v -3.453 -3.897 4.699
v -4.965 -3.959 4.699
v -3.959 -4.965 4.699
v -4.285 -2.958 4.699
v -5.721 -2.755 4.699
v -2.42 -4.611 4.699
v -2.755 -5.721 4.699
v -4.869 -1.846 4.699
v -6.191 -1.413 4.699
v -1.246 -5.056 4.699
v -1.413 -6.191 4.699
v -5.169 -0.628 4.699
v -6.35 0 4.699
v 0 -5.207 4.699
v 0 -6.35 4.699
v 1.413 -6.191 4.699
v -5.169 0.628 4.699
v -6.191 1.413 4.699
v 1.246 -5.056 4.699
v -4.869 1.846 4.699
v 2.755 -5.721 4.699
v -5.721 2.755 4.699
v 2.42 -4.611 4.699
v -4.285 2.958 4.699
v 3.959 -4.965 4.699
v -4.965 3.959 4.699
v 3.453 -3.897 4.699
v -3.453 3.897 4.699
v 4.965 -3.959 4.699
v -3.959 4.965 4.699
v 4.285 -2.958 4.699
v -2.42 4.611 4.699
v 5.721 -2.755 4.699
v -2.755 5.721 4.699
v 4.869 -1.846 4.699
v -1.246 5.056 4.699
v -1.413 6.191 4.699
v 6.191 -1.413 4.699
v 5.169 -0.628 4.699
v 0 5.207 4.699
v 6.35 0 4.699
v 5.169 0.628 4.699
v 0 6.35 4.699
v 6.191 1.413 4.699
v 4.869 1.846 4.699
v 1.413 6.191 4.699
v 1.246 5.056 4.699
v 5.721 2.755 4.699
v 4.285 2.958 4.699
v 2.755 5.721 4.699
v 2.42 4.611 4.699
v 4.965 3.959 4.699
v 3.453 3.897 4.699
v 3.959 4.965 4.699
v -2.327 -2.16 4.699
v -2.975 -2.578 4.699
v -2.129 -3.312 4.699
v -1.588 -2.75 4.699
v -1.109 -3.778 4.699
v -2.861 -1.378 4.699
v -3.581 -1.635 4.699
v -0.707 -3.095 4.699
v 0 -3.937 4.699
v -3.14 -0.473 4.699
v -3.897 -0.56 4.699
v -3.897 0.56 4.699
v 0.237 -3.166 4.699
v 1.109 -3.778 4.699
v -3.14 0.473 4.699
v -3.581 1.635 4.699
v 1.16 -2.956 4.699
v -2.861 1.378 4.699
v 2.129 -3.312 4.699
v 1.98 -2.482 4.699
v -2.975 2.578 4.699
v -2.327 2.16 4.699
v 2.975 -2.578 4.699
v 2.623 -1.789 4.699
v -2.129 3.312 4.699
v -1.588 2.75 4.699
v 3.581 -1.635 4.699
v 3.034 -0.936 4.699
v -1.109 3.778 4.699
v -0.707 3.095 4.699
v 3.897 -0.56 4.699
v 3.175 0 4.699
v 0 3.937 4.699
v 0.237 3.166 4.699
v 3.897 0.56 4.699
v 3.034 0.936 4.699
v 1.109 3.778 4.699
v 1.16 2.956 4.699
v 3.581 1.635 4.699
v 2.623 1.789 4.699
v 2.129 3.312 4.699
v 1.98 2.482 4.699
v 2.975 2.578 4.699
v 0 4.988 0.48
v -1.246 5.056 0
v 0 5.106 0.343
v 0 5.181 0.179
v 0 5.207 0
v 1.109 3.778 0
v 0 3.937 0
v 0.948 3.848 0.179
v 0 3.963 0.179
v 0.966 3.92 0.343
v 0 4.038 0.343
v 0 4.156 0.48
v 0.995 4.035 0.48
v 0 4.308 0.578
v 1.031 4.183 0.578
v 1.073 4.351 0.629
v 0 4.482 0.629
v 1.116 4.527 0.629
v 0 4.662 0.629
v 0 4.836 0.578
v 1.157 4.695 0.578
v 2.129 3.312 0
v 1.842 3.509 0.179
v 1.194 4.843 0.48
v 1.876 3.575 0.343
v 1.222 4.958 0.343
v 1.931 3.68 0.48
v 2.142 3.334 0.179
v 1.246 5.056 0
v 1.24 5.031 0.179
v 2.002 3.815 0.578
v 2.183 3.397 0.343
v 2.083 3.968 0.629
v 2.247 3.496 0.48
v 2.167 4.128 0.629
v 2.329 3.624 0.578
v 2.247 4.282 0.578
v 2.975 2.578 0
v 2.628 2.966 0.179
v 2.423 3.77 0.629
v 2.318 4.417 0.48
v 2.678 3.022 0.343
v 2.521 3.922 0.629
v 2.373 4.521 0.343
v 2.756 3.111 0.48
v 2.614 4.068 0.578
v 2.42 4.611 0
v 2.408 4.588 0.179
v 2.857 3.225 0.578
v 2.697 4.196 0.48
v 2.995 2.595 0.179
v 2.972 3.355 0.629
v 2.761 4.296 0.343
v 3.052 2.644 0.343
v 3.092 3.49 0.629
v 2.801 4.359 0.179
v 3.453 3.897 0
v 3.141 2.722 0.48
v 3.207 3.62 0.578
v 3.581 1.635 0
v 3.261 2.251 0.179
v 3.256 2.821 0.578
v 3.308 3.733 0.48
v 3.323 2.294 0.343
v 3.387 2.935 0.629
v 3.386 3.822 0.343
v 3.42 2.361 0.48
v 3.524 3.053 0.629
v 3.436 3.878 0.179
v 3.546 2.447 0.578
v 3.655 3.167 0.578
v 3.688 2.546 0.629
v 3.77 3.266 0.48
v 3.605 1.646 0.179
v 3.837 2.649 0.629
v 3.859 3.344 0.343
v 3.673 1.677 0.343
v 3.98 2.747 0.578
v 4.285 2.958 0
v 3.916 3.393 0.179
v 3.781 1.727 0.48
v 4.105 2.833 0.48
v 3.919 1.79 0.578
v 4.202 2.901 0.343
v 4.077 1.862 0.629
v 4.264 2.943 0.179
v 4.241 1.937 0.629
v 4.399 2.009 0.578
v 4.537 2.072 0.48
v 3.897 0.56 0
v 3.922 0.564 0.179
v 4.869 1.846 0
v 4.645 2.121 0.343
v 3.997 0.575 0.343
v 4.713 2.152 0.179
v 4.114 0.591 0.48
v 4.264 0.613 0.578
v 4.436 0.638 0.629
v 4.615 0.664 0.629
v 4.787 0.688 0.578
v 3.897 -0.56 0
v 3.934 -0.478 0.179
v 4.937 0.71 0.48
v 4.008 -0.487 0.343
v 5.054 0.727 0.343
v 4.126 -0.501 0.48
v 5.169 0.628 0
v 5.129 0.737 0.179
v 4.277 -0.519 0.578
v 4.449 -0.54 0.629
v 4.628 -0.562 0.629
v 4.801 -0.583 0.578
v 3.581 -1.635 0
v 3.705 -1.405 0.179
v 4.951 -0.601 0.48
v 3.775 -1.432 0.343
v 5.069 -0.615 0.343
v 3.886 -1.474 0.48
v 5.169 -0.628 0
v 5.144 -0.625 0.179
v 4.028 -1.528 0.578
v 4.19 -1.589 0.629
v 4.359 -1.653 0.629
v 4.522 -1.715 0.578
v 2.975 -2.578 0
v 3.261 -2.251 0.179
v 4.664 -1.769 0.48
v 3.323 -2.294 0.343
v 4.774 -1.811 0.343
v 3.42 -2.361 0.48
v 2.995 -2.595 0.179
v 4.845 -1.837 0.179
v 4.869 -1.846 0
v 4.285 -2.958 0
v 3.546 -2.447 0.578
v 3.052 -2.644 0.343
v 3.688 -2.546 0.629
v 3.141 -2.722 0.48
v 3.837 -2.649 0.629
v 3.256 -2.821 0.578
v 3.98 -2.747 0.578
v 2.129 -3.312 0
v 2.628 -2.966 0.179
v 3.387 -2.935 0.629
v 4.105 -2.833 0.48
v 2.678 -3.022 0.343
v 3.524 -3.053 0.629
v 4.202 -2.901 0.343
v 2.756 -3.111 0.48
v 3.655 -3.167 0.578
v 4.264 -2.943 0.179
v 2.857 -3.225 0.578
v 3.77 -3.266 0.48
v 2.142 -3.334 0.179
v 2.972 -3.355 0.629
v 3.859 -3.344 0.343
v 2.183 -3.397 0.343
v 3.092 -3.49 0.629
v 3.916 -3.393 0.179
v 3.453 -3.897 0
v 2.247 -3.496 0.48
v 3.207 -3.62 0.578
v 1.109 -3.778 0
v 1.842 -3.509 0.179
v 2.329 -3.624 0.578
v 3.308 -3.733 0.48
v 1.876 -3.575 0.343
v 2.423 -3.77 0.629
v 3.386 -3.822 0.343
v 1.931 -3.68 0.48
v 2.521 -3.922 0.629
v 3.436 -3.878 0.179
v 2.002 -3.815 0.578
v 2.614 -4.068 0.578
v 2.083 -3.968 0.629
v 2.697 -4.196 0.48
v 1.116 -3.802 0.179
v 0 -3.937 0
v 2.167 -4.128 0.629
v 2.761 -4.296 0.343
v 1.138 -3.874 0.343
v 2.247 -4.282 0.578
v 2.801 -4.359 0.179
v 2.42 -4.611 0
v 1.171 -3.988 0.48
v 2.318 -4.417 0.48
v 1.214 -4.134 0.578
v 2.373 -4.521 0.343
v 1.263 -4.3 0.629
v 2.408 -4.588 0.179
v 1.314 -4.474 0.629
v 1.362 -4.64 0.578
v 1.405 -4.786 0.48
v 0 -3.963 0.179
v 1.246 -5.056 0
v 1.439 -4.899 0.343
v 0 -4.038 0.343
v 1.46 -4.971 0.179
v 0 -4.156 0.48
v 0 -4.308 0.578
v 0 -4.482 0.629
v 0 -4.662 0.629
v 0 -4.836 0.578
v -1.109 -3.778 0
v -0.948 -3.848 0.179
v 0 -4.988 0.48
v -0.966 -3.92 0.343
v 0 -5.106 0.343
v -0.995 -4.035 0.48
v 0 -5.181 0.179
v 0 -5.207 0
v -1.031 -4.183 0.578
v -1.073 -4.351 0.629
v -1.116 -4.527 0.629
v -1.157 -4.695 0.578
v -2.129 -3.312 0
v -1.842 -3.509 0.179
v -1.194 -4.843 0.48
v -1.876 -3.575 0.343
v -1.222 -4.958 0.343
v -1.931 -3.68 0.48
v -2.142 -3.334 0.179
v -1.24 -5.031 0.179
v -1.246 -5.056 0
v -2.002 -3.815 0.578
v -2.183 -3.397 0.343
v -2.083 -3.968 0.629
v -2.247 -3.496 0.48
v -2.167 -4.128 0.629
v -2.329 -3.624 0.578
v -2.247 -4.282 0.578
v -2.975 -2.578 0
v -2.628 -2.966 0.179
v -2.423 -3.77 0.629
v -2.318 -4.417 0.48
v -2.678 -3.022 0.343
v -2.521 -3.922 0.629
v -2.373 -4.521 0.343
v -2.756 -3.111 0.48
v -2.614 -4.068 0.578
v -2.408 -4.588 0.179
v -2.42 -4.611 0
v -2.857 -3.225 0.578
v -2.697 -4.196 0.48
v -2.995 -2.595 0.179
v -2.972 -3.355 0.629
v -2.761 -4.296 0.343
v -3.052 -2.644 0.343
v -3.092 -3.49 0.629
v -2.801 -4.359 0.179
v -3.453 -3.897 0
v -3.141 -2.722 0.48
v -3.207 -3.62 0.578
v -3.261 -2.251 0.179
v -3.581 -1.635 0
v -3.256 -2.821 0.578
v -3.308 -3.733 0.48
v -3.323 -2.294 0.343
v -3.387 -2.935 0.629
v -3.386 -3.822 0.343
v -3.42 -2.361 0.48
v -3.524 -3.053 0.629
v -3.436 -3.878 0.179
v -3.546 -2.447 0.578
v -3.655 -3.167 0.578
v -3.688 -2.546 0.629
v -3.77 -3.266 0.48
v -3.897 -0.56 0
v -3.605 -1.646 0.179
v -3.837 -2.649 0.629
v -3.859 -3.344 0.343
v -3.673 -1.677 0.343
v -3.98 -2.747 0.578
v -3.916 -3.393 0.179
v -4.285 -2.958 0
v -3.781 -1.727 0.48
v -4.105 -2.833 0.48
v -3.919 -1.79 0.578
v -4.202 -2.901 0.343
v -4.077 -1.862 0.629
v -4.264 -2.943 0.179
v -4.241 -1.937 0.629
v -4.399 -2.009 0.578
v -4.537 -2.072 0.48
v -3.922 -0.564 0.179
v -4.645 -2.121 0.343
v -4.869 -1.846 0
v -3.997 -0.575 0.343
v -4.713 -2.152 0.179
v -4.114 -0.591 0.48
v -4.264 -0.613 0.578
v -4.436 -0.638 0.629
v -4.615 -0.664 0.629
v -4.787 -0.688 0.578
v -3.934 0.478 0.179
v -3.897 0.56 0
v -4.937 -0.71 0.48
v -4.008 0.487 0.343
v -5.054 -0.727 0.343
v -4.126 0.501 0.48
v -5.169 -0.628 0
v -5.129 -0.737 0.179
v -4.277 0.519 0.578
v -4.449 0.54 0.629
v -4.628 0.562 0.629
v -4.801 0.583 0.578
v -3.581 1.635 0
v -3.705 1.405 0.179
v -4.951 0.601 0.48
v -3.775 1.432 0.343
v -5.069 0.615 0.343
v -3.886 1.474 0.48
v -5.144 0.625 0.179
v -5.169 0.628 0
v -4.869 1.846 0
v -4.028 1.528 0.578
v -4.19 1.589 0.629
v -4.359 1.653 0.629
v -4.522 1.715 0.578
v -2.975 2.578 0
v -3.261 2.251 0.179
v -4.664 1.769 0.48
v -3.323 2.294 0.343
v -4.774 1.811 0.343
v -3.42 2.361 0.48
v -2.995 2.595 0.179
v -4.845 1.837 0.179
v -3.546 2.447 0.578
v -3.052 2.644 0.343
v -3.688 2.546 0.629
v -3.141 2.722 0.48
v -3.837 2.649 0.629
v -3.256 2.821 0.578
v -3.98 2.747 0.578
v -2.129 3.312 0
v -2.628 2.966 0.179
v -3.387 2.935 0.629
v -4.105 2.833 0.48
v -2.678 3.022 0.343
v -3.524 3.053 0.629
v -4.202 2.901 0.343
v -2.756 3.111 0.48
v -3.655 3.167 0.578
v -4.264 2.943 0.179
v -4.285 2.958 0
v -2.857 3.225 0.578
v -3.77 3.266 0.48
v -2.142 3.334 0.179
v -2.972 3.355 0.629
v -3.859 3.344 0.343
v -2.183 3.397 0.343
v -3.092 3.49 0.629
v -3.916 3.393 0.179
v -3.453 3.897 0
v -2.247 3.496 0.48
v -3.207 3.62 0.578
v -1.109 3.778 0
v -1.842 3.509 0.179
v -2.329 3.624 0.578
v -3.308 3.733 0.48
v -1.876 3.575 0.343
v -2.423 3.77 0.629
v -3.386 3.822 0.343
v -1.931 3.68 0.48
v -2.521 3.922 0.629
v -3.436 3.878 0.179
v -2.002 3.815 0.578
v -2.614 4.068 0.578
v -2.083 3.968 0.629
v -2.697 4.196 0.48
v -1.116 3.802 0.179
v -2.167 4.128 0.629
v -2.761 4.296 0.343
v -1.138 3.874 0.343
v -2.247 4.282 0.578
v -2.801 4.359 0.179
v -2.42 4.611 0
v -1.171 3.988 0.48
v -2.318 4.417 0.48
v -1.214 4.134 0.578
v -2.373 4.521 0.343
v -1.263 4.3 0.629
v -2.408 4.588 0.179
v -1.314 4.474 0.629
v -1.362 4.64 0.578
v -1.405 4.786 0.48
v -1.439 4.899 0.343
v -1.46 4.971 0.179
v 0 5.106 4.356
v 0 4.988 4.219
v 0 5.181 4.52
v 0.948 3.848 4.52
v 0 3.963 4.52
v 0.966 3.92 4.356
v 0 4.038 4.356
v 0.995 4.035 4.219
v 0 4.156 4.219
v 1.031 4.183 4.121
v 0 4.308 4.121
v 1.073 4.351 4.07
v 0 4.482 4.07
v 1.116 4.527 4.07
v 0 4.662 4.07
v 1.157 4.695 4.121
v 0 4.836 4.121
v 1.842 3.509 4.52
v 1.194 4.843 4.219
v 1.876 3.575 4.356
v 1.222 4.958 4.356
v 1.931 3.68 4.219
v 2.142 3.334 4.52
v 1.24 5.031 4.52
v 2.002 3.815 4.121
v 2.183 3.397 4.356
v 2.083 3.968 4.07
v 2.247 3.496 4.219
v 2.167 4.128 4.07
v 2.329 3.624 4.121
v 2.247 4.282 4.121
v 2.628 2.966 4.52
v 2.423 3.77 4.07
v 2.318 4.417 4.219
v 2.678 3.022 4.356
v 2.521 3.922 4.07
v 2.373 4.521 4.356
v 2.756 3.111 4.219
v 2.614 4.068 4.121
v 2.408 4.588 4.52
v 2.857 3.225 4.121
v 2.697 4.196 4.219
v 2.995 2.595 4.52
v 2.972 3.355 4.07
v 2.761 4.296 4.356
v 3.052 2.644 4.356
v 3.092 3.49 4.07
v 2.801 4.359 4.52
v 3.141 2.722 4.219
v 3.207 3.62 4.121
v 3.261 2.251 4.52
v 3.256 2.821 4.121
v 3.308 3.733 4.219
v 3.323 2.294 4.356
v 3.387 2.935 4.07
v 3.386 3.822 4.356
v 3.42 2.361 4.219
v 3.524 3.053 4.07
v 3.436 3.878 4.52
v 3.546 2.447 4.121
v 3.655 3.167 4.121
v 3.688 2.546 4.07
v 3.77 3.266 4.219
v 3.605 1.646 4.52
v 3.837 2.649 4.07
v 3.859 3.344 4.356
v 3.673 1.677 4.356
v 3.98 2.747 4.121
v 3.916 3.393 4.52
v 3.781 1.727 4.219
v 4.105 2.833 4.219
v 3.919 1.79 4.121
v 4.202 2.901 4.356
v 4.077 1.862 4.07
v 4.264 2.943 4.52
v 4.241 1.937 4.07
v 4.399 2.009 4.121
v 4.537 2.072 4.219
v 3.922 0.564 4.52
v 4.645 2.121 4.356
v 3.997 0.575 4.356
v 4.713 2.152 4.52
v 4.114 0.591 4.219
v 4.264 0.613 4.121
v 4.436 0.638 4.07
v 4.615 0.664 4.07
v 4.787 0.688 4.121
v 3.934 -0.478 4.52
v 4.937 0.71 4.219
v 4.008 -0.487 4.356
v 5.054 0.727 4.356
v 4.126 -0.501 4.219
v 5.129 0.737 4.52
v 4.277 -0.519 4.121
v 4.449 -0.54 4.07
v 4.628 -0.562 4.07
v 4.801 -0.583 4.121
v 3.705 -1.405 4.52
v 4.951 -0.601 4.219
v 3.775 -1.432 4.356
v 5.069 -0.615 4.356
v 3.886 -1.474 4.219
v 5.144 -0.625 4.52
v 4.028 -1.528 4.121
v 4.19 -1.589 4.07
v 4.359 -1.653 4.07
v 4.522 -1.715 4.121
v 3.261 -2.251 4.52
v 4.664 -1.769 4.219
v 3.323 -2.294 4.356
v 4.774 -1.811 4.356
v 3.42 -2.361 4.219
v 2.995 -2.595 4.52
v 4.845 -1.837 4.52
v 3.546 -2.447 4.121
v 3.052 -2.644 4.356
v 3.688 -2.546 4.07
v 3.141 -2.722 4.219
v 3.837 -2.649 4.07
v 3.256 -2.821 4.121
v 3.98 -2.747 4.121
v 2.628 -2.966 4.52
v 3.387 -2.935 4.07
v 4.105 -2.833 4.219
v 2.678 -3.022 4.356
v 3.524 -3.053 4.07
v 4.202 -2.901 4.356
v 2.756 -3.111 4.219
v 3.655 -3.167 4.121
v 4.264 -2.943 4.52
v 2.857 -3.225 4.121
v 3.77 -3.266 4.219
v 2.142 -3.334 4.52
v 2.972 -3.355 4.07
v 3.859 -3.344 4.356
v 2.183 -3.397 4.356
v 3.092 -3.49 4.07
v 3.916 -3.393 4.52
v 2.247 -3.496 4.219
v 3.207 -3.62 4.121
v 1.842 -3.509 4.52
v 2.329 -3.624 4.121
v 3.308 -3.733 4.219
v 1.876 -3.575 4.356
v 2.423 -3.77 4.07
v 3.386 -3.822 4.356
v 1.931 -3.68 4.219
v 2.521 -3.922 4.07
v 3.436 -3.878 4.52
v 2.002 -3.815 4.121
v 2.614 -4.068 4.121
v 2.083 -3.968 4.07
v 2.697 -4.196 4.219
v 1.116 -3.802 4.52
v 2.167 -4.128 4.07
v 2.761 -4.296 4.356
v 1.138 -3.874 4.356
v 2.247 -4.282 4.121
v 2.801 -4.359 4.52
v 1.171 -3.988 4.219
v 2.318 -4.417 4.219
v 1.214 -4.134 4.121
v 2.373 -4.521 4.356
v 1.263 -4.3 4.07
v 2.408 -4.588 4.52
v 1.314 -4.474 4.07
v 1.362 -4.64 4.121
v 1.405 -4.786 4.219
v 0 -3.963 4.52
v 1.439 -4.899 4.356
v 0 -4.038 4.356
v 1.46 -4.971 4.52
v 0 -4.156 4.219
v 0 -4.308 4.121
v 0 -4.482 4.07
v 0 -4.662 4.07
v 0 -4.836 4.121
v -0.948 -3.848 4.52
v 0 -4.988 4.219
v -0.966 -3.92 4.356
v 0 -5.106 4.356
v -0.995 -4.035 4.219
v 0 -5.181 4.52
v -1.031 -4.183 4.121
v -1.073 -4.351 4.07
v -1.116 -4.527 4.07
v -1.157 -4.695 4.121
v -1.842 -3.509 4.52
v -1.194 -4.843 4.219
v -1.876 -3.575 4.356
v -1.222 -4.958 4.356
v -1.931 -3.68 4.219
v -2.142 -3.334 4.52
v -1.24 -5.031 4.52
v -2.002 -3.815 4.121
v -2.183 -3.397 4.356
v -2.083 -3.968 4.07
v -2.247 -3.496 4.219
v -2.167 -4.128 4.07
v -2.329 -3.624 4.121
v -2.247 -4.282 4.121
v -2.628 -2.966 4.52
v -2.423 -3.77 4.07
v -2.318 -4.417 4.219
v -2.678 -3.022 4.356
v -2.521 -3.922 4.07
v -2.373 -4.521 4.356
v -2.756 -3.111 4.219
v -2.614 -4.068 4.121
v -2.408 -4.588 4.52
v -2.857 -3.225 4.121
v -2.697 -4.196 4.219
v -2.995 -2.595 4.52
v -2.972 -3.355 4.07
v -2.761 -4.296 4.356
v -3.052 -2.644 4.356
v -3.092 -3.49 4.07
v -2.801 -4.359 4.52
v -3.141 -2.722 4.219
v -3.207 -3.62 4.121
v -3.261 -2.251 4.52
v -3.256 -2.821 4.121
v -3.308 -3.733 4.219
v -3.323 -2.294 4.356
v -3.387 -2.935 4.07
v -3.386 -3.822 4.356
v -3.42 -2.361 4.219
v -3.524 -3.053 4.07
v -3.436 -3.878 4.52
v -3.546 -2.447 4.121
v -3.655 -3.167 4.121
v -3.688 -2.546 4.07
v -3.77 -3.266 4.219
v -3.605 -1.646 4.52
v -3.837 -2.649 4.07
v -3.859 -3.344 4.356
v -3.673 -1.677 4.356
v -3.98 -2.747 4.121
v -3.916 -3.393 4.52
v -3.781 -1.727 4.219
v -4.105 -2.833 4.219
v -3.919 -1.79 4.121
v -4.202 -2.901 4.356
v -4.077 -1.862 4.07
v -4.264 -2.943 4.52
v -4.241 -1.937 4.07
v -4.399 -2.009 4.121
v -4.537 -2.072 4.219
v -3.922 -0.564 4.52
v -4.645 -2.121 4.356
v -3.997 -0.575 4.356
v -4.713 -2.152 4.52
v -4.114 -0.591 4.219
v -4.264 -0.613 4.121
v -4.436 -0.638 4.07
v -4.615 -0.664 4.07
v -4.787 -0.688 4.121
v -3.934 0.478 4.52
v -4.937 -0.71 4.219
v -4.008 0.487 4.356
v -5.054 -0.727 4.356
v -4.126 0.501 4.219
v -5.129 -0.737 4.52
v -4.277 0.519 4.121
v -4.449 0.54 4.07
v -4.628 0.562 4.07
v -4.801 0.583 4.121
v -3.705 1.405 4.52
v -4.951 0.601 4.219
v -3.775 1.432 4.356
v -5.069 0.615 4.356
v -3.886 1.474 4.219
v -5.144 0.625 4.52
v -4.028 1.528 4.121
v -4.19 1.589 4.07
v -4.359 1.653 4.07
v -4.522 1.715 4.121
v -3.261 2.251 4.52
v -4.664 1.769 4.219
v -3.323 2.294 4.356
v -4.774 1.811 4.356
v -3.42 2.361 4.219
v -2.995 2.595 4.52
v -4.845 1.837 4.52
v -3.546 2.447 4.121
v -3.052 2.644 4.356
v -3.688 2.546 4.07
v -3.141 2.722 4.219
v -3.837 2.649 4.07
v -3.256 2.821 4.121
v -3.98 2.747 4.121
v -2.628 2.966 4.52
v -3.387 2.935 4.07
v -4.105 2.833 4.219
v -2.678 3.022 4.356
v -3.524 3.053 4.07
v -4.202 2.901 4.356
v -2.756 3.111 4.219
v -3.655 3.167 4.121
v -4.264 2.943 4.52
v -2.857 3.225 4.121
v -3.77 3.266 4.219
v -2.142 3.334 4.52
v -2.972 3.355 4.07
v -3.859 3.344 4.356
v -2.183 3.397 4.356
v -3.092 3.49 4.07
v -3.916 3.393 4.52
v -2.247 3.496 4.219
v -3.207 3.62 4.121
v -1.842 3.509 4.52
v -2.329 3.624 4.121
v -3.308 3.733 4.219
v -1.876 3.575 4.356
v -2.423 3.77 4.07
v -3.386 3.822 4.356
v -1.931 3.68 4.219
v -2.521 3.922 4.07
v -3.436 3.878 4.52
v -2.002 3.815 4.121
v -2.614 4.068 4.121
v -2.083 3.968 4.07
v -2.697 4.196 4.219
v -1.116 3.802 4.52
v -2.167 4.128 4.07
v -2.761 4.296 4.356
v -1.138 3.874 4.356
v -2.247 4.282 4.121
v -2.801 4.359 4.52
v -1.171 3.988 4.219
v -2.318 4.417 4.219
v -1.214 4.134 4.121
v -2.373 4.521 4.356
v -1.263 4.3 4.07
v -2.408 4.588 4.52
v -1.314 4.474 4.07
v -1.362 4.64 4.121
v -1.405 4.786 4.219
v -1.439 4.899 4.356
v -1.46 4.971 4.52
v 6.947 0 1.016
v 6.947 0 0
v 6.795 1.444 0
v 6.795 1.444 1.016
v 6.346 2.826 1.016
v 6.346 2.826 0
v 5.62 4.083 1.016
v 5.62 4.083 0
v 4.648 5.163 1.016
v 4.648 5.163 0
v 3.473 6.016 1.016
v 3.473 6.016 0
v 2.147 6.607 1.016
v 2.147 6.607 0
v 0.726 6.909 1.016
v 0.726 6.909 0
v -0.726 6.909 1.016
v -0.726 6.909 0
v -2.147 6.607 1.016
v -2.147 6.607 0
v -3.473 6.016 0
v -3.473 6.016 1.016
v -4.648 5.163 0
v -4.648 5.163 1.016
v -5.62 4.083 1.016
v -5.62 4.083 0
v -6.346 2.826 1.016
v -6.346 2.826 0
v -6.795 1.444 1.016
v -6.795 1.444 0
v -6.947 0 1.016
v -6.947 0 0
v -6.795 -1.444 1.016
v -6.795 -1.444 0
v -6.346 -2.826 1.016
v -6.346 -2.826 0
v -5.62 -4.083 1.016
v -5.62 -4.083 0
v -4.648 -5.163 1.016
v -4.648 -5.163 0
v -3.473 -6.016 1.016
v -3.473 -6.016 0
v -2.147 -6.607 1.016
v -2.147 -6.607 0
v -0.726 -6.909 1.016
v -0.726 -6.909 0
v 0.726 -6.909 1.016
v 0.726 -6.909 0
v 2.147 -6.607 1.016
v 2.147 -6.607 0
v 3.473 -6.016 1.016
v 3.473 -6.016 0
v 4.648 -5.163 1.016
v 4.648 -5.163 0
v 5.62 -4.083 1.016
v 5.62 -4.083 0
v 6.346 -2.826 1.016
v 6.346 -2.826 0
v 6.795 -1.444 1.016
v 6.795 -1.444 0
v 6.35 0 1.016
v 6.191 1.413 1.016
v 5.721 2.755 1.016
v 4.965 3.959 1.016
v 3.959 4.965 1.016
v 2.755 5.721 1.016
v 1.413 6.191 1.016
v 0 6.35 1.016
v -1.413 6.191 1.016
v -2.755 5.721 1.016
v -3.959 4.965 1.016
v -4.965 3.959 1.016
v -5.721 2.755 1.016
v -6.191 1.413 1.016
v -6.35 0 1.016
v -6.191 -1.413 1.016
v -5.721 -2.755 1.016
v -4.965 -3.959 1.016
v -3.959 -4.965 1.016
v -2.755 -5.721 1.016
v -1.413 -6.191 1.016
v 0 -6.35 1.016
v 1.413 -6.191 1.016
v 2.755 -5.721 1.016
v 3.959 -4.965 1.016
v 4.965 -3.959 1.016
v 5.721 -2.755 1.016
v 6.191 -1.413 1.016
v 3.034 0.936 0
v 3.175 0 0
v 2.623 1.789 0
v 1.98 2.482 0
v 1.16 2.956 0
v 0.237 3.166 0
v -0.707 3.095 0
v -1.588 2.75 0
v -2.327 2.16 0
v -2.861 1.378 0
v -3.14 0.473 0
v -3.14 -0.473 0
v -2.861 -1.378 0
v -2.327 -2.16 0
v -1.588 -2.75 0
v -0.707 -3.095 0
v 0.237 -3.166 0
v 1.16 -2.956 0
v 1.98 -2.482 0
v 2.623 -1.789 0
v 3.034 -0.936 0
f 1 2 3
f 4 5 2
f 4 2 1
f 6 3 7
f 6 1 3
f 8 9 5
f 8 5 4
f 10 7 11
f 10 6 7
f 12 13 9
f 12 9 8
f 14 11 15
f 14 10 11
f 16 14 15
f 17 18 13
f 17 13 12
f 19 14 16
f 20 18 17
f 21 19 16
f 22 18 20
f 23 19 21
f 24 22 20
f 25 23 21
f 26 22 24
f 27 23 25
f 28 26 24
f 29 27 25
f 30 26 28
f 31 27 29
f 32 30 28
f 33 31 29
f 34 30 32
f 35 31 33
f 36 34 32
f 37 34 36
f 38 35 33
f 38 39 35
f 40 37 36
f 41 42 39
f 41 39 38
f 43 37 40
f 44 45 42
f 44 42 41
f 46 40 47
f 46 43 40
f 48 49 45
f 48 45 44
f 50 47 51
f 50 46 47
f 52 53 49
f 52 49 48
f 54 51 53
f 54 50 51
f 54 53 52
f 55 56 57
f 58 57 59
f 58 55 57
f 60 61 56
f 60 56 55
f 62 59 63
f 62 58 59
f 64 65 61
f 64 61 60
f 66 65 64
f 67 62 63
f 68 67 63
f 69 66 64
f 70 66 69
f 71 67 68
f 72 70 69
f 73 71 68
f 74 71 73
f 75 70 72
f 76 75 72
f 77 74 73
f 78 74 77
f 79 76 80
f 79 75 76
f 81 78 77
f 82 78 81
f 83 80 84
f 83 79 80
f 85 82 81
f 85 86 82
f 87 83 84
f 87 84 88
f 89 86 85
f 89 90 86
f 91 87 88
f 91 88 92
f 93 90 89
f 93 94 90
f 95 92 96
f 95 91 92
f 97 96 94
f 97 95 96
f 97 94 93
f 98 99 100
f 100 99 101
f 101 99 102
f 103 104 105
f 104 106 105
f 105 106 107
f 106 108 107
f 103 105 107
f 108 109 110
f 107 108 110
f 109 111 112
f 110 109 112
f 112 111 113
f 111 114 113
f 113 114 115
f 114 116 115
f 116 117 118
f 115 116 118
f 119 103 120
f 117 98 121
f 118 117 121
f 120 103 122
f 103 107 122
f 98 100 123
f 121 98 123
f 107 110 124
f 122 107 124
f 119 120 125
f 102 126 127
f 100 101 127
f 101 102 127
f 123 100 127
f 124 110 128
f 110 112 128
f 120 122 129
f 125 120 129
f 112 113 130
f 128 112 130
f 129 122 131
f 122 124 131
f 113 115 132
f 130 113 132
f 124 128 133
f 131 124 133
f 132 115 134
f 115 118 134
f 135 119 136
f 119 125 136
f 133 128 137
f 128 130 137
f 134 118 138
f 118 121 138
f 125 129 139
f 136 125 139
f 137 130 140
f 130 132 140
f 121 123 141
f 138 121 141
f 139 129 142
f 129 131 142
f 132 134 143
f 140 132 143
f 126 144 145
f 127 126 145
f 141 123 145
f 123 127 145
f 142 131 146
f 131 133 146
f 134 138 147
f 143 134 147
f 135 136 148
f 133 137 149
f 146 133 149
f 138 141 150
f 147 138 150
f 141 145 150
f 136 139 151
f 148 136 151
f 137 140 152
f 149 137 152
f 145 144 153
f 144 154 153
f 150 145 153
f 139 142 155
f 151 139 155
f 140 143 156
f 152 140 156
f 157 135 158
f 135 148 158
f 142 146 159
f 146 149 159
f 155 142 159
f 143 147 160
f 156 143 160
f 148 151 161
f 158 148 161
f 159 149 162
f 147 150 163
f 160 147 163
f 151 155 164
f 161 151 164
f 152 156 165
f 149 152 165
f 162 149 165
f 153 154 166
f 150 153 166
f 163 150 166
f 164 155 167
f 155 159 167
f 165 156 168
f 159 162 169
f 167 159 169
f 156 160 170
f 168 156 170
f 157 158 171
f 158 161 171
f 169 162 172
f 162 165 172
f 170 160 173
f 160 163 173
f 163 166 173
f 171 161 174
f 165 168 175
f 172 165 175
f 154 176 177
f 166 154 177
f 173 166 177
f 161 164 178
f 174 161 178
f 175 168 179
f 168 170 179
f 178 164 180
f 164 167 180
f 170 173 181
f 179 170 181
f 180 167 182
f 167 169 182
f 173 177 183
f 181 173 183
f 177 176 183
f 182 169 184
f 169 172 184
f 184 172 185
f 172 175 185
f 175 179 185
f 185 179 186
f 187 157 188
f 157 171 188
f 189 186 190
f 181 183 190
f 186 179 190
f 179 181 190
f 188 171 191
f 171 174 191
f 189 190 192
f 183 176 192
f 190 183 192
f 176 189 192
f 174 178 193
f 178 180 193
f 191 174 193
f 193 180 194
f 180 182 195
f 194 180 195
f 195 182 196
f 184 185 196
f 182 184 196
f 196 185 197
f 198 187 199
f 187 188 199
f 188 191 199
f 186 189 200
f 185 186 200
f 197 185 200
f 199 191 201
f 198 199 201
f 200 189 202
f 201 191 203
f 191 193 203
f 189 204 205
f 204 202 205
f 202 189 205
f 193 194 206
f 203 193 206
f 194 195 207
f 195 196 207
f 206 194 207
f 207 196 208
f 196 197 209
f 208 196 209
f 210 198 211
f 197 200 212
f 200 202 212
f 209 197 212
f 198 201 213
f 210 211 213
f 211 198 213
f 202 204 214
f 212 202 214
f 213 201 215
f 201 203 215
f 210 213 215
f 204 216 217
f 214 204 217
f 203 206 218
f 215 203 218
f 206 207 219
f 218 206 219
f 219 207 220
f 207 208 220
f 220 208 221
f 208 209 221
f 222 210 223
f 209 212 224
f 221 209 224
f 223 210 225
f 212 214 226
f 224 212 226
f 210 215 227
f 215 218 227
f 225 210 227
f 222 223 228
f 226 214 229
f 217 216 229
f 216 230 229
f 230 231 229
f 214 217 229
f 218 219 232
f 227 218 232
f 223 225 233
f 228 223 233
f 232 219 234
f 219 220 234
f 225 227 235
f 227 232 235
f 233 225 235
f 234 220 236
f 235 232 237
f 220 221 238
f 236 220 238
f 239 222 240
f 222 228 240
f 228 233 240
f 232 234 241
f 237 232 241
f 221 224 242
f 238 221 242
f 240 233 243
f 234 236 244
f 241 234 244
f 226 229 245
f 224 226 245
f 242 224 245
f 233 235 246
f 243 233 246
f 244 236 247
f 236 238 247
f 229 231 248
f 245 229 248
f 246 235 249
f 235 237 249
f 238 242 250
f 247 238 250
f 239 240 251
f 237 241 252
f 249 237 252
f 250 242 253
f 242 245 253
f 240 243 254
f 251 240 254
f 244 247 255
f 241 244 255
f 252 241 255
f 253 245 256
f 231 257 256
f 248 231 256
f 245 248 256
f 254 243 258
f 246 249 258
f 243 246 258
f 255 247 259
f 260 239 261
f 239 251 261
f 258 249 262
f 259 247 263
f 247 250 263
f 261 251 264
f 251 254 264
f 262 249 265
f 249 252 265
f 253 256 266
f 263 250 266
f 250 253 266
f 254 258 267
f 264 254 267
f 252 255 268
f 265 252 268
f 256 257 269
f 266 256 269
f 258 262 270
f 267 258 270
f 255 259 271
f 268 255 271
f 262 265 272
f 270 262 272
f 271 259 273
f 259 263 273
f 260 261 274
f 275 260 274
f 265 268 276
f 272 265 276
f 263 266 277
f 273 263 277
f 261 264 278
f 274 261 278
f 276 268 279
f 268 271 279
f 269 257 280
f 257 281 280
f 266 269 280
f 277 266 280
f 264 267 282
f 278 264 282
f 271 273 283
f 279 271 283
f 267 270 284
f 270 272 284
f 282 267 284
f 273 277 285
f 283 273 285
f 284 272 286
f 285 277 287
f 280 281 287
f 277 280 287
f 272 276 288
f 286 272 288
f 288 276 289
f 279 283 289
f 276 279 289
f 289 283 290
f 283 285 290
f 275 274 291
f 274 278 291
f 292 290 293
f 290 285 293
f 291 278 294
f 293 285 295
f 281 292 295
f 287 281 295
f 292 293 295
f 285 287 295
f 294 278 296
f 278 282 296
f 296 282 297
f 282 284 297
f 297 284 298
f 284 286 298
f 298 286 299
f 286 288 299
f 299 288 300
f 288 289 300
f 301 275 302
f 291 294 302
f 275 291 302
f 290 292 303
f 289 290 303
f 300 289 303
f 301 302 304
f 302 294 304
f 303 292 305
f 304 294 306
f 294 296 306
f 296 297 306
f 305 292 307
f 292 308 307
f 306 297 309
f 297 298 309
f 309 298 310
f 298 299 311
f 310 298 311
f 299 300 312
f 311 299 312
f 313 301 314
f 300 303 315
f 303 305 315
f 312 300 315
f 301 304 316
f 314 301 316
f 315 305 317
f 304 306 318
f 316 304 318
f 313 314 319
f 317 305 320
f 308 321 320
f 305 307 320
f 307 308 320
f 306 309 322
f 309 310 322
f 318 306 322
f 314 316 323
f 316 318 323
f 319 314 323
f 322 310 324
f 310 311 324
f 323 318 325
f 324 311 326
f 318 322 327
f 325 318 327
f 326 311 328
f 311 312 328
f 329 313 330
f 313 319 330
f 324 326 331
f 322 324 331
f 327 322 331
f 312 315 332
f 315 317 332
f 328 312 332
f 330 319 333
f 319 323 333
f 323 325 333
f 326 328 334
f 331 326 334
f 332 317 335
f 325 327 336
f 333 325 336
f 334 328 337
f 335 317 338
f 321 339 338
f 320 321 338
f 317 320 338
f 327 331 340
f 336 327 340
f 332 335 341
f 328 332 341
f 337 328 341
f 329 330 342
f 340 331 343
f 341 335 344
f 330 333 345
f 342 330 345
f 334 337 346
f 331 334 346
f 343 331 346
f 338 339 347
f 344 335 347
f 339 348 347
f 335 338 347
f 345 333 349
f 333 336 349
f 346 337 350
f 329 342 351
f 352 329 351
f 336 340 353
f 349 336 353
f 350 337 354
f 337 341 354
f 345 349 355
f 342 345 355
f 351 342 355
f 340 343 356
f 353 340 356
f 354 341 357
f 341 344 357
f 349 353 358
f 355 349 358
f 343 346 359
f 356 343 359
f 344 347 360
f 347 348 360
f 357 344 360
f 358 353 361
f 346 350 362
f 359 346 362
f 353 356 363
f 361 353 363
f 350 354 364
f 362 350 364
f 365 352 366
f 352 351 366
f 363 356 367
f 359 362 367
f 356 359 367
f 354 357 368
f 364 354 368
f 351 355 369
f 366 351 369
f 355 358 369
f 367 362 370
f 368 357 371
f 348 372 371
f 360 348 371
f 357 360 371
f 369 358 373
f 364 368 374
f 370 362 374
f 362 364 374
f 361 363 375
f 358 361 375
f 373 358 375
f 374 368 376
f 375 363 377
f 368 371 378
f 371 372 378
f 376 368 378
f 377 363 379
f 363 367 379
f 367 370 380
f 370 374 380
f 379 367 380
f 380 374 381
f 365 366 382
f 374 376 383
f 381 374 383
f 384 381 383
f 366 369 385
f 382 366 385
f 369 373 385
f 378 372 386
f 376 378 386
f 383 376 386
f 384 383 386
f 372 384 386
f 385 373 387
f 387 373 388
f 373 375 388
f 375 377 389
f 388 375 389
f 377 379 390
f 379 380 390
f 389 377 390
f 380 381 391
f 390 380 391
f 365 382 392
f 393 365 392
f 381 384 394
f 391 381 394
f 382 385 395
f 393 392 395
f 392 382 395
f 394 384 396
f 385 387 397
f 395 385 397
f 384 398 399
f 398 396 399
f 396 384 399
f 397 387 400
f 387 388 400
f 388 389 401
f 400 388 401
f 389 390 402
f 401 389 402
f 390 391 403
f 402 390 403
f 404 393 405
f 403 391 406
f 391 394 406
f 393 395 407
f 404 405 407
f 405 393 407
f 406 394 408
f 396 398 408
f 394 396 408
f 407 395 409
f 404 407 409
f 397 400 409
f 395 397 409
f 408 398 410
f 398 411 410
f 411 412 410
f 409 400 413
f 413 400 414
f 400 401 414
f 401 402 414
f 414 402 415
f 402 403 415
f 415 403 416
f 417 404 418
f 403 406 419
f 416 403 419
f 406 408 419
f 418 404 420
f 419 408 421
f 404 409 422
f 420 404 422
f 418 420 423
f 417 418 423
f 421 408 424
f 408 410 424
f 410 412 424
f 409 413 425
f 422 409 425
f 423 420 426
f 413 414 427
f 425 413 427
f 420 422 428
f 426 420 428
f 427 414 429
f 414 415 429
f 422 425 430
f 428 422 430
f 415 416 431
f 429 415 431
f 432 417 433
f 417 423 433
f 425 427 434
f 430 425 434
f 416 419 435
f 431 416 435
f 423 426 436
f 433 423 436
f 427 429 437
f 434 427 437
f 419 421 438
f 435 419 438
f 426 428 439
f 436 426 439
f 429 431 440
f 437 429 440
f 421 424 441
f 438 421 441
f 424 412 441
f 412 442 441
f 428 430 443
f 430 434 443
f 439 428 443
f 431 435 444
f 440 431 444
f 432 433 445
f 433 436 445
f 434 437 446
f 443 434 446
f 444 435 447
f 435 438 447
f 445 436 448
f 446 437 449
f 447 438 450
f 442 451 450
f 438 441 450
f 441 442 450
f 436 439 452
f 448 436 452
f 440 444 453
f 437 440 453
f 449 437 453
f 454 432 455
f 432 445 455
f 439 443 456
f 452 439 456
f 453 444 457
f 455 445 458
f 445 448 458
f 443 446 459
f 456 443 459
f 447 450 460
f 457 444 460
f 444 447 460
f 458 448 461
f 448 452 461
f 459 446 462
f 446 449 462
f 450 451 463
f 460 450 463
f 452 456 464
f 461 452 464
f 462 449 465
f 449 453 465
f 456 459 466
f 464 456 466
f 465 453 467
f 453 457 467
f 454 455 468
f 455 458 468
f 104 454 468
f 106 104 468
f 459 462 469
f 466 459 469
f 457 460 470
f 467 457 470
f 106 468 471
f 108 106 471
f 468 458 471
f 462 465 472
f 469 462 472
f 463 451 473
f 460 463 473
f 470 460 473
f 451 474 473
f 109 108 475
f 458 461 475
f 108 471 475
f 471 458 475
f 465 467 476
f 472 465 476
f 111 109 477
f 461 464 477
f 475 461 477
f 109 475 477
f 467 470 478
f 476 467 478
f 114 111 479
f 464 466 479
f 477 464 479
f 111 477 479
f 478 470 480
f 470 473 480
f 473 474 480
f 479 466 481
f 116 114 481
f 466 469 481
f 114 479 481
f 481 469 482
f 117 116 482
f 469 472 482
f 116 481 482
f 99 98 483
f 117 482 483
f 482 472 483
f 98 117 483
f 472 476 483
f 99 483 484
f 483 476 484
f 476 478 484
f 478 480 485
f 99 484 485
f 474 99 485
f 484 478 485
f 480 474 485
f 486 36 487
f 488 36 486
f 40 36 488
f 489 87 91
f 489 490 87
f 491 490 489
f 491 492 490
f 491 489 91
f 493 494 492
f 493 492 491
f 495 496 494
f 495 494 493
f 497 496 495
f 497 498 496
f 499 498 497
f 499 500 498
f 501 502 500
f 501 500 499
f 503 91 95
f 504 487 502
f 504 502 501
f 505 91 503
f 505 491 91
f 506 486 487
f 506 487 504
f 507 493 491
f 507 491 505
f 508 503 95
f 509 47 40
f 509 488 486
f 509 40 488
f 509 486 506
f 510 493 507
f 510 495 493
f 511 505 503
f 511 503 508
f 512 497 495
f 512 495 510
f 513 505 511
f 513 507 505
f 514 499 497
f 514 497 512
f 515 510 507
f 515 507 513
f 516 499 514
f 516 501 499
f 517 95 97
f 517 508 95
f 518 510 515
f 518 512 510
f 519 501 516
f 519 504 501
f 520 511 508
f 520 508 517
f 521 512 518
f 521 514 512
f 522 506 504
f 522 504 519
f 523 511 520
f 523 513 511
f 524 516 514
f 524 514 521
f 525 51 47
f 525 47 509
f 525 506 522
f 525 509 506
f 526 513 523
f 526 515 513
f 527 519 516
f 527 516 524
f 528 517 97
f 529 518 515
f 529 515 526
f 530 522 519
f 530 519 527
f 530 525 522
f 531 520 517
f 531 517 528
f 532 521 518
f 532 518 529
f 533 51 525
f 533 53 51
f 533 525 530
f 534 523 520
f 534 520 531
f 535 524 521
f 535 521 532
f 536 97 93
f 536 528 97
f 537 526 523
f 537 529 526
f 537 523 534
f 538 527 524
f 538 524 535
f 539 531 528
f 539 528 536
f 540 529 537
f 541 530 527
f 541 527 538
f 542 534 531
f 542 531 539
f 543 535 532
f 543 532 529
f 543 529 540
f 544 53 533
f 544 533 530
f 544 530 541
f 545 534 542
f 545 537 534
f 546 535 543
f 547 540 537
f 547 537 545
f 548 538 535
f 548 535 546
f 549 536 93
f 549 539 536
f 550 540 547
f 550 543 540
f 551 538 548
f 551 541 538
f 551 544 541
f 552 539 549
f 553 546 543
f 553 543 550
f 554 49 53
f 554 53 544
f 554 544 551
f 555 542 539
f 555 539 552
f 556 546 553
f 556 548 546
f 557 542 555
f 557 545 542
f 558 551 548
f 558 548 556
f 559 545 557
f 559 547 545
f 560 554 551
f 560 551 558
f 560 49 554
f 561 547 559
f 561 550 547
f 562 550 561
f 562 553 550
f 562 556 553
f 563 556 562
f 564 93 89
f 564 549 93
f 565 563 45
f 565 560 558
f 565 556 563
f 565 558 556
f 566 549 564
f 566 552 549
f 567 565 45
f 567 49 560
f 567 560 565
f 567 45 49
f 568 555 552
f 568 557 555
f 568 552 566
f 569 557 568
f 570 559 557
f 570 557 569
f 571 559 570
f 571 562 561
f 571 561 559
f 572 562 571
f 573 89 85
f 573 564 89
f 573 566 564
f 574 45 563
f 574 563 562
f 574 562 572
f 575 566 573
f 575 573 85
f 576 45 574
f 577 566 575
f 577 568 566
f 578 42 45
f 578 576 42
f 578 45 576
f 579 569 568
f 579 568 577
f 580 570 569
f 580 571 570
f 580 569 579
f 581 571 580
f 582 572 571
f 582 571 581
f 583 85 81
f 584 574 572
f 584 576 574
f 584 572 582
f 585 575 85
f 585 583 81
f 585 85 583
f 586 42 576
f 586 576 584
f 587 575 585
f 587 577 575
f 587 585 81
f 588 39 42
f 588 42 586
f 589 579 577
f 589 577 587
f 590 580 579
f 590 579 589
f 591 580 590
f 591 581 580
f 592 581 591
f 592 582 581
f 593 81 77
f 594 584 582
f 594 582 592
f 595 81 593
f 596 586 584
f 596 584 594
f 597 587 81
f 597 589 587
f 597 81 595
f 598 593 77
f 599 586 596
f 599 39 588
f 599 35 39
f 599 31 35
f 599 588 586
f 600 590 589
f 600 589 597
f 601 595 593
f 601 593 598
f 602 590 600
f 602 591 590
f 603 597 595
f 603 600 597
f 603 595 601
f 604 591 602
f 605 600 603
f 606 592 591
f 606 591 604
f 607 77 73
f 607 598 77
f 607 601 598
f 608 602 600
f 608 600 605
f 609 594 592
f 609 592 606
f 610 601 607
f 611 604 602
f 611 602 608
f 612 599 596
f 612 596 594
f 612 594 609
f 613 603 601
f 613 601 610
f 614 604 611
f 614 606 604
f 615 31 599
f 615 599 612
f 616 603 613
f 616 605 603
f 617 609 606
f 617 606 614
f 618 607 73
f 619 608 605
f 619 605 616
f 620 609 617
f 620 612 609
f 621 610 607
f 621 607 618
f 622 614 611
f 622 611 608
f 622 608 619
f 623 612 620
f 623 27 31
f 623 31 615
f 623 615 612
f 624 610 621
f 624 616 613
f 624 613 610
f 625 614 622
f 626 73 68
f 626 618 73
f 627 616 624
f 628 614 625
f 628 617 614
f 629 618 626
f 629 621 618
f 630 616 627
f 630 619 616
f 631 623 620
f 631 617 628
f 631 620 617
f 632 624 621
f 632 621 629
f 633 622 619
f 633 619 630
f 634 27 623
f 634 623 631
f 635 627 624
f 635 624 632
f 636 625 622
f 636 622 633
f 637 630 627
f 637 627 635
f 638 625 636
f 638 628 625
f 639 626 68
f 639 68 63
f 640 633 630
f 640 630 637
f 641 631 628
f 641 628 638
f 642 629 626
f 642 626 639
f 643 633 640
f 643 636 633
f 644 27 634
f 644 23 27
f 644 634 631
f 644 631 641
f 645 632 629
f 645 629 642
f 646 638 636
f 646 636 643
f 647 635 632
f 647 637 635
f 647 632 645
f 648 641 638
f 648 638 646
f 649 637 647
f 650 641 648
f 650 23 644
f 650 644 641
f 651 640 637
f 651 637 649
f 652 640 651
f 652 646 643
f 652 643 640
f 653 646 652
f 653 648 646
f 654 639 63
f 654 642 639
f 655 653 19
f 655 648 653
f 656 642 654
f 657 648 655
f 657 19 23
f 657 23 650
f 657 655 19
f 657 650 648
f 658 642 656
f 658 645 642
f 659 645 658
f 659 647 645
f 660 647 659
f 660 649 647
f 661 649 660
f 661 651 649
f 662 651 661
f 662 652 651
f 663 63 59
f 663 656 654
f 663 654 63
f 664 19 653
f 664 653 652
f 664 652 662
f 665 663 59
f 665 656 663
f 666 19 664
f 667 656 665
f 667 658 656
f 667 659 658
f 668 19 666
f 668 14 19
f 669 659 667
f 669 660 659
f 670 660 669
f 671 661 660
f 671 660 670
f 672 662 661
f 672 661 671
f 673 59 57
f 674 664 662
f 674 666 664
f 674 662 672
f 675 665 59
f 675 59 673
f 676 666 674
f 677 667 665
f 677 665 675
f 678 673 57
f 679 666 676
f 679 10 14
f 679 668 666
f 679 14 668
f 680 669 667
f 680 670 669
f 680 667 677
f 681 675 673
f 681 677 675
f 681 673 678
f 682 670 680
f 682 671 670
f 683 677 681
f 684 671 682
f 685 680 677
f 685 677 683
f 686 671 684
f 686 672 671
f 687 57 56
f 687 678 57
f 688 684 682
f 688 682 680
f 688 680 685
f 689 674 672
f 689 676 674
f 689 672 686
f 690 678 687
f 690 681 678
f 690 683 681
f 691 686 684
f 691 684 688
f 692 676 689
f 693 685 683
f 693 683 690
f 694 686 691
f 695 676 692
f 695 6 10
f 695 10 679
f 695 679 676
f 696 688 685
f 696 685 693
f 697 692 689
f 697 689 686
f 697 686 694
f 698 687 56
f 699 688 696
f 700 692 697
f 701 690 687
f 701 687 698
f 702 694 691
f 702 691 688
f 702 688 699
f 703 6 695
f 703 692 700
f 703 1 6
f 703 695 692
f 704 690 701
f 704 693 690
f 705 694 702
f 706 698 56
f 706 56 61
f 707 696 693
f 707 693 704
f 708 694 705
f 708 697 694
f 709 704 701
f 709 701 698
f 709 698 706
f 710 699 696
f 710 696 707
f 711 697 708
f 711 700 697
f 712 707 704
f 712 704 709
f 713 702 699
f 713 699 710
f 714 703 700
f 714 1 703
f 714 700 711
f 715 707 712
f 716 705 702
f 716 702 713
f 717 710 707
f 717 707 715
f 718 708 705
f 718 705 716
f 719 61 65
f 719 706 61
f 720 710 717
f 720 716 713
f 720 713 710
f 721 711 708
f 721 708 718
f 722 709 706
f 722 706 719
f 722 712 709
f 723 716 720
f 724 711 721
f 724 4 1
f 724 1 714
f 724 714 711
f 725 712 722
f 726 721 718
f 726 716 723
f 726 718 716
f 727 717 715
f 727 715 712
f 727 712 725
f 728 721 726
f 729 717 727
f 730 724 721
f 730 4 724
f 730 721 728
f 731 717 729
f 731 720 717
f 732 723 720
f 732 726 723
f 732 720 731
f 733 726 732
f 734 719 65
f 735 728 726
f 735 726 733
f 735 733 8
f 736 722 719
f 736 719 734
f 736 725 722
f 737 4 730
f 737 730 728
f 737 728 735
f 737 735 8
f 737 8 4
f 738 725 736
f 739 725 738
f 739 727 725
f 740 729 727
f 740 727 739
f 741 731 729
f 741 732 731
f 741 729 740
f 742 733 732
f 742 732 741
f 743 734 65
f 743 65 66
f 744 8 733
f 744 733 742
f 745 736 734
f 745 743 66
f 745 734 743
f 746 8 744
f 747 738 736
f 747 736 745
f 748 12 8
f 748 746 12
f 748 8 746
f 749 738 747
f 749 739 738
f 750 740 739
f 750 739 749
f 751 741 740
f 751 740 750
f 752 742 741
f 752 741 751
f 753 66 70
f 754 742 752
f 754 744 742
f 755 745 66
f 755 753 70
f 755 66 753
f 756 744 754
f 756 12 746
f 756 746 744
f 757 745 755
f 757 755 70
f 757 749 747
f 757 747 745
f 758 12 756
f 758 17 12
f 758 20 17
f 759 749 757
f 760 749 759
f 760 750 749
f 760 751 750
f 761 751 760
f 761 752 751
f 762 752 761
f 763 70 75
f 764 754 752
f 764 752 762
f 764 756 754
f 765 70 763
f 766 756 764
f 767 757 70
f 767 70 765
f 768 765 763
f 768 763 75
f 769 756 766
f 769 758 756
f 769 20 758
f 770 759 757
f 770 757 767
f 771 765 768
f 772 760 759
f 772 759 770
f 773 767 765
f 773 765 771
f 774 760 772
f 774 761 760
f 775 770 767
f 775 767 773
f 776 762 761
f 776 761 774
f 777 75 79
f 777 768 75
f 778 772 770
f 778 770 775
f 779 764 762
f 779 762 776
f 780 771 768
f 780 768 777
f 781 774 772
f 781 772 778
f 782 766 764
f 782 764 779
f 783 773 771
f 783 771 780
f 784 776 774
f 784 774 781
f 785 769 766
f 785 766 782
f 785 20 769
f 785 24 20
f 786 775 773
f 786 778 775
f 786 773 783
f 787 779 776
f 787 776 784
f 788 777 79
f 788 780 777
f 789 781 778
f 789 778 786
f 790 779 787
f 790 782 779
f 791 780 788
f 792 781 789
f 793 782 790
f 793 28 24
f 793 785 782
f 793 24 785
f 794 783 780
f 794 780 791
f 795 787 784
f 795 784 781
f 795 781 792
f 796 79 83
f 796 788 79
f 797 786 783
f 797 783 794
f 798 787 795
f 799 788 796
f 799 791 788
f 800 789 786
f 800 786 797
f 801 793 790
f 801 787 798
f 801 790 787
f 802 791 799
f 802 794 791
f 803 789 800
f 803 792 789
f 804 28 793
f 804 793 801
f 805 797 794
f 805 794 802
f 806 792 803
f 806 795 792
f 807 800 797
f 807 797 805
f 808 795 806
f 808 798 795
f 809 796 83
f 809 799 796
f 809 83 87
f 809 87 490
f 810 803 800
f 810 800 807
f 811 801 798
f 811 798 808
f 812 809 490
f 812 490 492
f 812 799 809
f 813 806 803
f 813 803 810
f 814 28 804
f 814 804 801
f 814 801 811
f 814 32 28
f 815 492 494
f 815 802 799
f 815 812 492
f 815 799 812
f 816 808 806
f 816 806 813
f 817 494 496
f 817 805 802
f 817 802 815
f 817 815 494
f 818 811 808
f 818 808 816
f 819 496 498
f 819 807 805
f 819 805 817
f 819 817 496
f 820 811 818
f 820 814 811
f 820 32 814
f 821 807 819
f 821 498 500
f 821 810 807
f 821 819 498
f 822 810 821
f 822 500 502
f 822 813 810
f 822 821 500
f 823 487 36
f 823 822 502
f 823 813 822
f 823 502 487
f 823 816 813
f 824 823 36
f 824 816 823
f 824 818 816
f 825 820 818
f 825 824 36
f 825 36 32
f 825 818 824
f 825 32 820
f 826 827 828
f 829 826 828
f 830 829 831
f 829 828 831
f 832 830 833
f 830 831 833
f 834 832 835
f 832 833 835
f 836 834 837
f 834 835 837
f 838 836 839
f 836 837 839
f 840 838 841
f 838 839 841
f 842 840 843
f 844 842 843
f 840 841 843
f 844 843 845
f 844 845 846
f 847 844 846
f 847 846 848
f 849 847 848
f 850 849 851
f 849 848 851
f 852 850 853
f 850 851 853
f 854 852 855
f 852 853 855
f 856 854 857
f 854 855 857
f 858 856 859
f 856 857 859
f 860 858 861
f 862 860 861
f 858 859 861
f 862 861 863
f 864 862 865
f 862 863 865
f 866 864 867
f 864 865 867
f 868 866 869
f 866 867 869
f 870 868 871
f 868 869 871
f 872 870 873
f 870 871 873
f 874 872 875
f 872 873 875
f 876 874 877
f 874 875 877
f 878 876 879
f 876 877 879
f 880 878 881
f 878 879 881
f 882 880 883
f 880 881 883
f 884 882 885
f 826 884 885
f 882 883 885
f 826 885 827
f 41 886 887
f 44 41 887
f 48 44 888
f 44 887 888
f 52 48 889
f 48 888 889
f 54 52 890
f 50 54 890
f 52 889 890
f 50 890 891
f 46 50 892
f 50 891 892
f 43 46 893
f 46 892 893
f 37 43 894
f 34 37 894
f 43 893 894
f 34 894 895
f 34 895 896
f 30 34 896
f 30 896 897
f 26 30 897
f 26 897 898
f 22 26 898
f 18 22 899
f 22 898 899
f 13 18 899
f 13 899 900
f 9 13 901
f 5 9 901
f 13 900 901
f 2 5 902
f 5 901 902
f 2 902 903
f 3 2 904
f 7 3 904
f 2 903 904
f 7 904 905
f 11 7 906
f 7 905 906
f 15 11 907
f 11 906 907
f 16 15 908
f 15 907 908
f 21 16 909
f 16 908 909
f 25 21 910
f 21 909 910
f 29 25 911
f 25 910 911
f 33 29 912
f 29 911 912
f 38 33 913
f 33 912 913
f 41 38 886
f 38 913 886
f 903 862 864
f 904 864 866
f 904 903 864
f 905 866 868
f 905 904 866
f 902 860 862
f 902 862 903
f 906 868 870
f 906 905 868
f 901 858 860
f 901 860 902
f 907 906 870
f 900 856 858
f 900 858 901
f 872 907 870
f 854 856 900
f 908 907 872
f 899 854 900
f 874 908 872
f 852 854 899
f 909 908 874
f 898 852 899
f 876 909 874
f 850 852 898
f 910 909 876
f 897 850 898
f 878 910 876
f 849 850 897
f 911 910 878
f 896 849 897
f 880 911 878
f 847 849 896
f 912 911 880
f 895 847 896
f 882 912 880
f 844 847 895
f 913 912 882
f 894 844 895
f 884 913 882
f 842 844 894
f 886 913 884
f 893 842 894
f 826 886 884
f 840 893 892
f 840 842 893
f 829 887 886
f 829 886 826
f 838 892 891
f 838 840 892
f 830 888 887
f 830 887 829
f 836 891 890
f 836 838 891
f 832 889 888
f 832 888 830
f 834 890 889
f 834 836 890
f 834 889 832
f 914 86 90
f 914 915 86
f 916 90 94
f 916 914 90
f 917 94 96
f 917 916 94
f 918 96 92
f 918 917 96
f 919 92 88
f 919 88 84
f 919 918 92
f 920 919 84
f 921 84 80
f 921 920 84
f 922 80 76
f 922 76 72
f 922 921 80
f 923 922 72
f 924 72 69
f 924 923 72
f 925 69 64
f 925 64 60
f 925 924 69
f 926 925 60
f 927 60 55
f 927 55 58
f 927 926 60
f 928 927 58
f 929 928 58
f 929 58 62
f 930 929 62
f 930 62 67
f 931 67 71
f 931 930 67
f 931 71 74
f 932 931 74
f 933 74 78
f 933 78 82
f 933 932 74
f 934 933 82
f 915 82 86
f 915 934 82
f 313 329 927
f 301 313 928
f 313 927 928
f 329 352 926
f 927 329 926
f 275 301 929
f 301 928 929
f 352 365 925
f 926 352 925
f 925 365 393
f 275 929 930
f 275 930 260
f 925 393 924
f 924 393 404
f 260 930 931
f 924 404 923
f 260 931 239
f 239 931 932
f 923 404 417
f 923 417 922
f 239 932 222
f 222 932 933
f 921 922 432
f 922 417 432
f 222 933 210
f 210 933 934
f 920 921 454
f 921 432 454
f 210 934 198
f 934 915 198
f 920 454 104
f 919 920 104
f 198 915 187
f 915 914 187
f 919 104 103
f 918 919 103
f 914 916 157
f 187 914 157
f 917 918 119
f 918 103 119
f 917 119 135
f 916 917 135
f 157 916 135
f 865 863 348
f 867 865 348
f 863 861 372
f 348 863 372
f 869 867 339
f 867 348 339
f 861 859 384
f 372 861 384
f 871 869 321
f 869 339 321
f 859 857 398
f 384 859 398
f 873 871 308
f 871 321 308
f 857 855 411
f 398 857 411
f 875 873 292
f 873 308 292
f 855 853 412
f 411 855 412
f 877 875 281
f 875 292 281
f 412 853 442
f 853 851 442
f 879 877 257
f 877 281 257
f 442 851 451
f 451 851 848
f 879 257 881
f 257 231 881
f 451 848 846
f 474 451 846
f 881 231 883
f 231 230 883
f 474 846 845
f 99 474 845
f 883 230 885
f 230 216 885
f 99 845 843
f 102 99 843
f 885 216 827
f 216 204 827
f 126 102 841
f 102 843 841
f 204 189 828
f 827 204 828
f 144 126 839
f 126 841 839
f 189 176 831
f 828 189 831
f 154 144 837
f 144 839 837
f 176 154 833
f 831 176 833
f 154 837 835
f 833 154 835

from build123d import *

# Parameters (mm, degrees)
SKETCH1_R           = 6.9469
SKETCH1_R_2         = 3.175
BOSS_EXTRUDE1_DEPTH = 1.016
SKETCH2_R           = 6.35
SKETCH2_R_2         = 3.175
BOSS_EXTRUDE2_DEPTH = 3.683


with BuildPart() as part:
    # Sketch1 → Boss-Extrude1 (new body)
    with BuildSketch(Plane.XY):
        Circle(SKETCH1_R)
        Circle(SKETCH1_R_2, mode=Mode.SUBTRACT)
    extrude(amount=BOSS_EXTRUDE1_DEPTH)

    # Sketch2 → Boss-Extrude2 (add)
    with BuildSketch(Plane.XY.offset(1.016)):
        Circle(SKETCH2_R)
        Circle(SKETCH2_R_2, mode=Mode.SUBTRACT)
    extrude(amount=BOSS_EXTRUDE2_DEPTH)

    # Sketch7 → Cut-Revolve2 (revolve, cut)
    with BuildSketch(Plane(origin=(0, 0, 0), x_dir=(0, 0, -1), z_dir=(1, 0, 0))):
        with BuildLine():
            Line((-4.699, 5.207), (-4.699, 3.937))
            ThreePointArc((-4.699, 3.937), (-4.064, 4.572), (-4.699, 5.207))
        make_face()
        with BuildLine():
            Line((0, 5.207), (0, 3.937))
            ThreePointArc((0, 3.937), (-0.635, 4.572), (0, 5.207))
        make_face()
    revolve(axis=Axis((0, 0, 4.699), (0, 0, -1)), mode=Mode.SUBTRACT)


solid = part.part
